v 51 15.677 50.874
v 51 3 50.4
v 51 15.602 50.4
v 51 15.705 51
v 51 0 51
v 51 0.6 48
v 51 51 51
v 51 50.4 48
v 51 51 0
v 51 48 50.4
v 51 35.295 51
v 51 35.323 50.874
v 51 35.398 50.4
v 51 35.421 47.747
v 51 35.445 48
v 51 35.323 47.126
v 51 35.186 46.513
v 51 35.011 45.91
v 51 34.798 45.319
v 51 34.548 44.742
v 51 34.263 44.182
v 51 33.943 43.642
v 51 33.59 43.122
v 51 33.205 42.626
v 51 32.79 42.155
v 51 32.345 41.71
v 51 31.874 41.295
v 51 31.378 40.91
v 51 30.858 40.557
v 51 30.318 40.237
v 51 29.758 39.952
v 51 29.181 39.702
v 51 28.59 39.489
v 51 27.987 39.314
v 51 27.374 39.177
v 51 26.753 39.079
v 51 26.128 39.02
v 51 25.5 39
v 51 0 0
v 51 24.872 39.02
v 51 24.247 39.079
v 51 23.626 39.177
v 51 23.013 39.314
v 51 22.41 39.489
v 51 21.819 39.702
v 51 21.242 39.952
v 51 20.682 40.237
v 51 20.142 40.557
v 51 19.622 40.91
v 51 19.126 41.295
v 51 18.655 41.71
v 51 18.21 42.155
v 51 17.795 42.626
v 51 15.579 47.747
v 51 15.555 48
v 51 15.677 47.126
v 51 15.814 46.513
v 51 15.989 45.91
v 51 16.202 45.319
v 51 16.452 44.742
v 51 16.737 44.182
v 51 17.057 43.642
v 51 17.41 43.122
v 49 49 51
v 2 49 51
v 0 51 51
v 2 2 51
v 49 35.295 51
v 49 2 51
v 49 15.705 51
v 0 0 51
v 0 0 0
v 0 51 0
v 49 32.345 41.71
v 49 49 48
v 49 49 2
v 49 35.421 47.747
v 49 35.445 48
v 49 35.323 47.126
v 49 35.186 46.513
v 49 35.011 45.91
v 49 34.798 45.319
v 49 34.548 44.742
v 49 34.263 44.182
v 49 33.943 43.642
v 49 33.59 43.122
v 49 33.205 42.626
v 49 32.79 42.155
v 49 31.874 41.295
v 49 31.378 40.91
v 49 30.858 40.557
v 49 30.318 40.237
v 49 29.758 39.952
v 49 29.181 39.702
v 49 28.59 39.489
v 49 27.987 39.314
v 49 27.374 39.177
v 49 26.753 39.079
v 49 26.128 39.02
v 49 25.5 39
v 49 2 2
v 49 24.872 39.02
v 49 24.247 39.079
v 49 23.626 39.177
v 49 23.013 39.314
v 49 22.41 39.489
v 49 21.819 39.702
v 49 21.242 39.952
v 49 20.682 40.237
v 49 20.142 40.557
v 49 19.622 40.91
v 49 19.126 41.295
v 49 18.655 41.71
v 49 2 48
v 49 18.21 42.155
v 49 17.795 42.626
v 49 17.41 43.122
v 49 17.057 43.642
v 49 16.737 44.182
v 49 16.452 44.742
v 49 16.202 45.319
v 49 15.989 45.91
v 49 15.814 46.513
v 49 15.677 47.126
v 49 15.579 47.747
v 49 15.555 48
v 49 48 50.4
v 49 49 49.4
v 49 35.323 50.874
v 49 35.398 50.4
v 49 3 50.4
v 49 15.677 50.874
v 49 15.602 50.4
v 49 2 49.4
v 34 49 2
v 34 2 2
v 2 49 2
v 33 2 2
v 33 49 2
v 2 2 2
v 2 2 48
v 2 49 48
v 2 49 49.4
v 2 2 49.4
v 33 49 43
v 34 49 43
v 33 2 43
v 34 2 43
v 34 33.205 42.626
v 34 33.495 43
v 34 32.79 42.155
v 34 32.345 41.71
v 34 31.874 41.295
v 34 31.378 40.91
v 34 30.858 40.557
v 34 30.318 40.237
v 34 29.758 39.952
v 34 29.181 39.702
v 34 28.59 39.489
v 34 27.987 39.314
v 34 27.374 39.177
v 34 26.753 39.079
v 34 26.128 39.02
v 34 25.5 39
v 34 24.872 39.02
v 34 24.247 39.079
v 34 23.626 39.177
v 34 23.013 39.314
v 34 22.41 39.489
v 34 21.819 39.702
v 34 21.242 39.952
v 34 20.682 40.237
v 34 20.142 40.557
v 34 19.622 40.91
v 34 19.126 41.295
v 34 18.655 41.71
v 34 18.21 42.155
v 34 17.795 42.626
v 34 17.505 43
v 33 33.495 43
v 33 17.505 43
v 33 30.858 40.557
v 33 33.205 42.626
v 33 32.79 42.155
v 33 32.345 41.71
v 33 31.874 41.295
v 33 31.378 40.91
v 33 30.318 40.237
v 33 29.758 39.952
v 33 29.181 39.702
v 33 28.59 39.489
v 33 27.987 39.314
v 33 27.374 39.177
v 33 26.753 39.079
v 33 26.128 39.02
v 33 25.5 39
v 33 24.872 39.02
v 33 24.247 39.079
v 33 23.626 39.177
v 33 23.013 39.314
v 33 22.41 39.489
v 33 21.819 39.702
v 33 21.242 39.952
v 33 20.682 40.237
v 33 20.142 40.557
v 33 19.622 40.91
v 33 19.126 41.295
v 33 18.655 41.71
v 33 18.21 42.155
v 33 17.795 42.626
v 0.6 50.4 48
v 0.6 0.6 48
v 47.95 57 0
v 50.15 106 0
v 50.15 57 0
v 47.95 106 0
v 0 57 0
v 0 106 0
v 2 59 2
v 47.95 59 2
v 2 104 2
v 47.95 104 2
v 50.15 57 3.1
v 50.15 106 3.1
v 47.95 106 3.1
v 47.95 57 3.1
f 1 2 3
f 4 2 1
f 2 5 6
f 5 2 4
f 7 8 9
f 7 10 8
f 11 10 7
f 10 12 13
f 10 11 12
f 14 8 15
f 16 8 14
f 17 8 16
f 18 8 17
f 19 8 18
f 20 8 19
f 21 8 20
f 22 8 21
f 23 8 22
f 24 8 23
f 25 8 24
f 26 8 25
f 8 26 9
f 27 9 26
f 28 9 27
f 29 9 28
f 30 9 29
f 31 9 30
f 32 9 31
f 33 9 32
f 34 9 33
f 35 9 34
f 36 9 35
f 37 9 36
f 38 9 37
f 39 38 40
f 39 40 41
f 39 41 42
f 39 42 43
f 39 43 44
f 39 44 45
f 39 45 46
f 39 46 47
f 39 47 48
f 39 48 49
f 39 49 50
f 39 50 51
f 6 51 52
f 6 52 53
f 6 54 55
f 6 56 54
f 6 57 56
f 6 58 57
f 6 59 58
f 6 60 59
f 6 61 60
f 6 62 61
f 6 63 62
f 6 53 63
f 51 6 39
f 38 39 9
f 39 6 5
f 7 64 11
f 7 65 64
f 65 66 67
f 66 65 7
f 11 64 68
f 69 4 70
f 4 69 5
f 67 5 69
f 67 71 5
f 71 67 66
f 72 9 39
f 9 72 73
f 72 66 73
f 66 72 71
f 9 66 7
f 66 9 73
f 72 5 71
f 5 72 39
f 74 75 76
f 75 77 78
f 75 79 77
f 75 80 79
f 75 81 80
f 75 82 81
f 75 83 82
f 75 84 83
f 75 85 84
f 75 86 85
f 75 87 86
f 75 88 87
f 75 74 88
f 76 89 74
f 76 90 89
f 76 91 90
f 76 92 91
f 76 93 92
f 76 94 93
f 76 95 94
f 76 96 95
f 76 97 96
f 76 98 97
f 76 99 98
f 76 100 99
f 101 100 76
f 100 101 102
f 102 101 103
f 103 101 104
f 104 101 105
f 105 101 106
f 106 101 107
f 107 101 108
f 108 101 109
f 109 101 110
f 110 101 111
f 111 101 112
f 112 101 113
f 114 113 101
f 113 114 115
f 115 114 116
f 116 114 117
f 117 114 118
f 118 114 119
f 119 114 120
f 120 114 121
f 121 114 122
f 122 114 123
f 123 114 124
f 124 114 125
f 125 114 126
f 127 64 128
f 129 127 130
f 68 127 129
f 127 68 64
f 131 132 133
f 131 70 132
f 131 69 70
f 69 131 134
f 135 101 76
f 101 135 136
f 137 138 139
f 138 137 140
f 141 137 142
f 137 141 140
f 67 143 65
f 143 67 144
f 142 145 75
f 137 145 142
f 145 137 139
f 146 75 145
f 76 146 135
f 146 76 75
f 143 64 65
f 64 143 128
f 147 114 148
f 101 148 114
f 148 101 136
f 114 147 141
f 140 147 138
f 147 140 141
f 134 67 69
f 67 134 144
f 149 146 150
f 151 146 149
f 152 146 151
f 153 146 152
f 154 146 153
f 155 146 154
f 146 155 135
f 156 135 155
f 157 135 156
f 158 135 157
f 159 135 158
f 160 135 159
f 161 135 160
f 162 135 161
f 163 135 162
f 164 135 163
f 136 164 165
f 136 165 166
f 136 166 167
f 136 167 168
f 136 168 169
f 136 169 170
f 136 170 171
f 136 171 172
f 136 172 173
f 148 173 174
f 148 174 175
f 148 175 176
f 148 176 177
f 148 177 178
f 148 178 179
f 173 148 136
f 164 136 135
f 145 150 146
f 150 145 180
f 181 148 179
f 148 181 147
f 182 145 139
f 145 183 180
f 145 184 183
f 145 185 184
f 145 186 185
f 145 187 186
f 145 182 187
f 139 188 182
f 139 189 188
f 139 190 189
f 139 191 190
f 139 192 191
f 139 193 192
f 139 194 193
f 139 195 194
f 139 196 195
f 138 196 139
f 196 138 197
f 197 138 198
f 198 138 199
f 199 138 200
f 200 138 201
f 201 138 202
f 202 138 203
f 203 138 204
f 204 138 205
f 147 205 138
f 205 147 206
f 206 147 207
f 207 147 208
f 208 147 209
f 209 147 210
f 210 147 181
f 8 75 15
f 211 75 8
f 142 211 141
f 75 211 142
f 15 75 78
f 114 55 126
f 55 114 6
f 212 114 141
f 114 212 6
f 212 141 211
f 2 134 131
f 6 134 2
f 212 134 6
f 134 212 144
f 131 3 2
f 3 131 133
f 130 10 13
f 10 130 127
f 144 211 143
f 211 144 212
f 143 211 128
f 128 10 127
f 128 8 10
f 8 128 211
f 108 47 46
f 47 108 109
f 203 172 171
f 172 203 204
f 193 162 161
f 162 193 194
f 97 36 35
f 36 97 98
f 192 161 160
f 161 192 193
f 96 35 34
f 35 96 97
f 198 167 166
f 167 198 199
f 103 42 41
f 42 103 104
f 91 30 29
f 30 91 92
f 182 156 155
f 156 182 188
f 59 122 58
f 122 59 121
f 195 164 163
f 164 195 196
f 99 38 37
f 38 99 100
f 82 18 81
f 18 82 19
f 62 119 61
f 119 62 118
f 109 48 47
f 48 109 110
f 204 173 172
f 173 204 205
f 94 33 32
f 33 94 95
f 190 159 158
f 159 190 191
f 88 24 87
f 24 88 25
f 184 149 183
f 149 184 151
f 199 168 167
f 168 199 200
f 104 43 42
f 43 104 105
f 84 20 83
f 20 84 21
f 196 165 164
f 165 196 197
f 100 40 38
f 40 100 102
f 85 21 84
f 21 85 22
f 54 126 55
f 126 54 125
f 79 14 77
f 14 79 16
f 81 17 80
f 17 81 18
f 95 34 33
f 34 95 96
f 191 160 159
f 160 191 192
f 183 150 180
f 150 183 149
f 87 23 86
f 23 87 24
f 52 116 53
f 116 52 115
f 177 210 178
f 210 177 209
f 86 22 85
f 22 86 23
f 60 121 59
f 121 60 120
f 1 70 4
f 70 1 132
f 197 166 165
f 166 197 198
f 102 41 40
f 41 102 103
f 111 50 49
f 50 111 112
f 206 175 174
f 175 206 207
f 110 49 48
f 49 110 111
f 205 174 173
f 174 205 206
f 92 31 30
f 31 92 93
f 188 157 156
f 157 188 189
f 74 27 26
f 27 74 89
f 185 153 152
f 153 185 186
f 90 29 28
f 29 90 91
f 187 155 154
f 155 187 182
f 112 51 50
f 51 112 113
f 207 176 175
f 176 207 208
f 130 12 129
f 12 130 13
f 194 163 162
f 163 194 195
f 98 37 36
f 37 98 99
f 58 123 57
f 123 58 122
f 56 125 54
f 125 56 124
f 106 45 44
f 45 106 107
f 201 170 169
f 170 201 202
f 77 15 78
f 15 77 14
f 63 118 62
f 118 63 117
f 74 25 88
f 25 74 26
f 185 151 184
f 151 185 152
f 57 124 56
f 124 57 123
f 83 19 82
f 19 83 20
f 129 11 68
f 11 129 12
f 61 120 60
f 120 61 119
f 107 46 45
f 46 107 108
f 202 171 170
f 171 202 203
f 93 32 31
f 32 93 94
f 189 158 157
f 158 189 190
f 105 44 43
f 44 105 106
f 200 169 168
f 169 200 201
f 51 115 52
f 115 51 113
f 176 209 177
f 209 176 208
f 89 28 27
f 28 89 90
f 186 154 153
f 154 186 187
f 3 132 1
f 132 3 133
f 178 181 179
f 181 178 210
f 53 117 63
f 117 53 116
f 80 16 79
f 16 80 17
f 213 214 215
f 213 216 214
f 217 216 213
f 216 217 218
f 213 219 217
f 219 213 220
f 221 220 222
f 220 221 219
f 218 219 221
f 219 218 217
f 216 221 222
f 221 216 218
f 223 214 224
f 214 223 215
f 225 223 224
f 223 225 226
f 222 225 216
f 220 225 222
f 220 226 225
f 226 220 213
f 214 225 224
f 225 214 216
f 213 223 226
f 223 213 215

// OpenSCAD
// file: carcassonne_box.scad
/**
 * @file carcassonne_box.scad
 * @author Conlan Wesson (modified by [Your Name])
 * Template for Carcassonne boxes.
 * @copyright Creative Commons Attribution-NonCommercial-ShareAlike 4.0
 */

mm = 1;
cm = 10*mm;

width = 47*mm;
thick = 2.5*mm;
wall = 2*mm;

/**
 * Lid for box.
 * @param sections Array of section lengths.
 * @param columns Number of columns.
 * @param icon Path to icon DXF file.
 * @param rot Icon rotation in degrees.
 * @param mult Icon scale.
 * @param xoff X-offset of icon from center.
 * @param yoff Y-offset of icon from center.
 */
module carcassonne_lid(sections, columns=1, icon=false, icon2=false, icon3=false, rot=0, mult=1, xoff=0, yoff=0, mult2=1, xoff2=0, yoff2=0, mult3=1, xoff3=0, yoff3=0, g=0){
    length = sum(sections) + ((width/2) - (sum(sections) % (width/2)));
    w = length+(1.5*wall)+.1;
    l = (width*columns)+wall;
    h = wall;
    d = 2;

    CubePoints = [
        [ 0-g, 0-g,   0 ],  //0
        [ w+g, 0-g,   0 ],  //1
        [ w+g, l+g,   0 ],  //2
        [ 0-g, l+g,   0 ],  //3
        [   d,   d, h+g ],  //4
        [   w,   d, h+g ],  //5
        [   w, l-d, h+g ],  //6
        [   d, l-d, h+g ]   //7
    ];
    
    CubeFaces = [
        [0,1,2,3],  // bottom
        [4,5,1,0],  // front
        [7,6,5,4],  // top
        [5,6,2,1],  // right
        [6,7,3,2],  // back
        [7,4,0,3]   // left
    ];
    
    difference(){
        union(){
            polyhedron( CubePoints, CubeFaces );
            translate([w-wall-.15,0,0]) cube([wall+.2,l, (1.5*wall)+.1]);
        }
        if(icon){
            translate([w/2+xoff,l/3+yoff,h-(wall/2)]){
                linear_extrude(height=(wall)+.1){
                    rotate(rot) scale(mult) import(icon);
                }
            }
        }
        if(icon2){
            translate([w/2+xoff2,l/3+yoff2,h-(wall/2)]){
                linear_extrude(height=(wall)+.1){
                    rotate(rot) scale(mult2) import(icon2);
                }
            }
        }
        if(icon3){
            translate([w/2+xoff3,l/3+yoff3,h-(wall/2)]){
                linear_extrude(height=(wall)+.1){
                    rotate(rot) scale(mult3) import(icon3);
                }
            }
        }
    }
}

/**
 * Carcassonne card box.
 * @param sections Array of section lengths.
 * @param columns Number of columns.
 */
module carcassonne_box(sections, columns=1){
    raw_length = sum(sections);
    extra_space = ((width/2) - (raw_length % (width/2))) % (width/2);
    length = raw_length + extra_space;
    
    section_count = len(sections);
    adjusted_sections = [for (i = [0:section_count-1]) 
        sections[i] + (extra_space / section_count)];
    
    difference(){
        union(){
            difference(){
                // Outer walls
                cube([length+(2*wall), (width*columns)+(2*wall), width+(2*wall)]);
                // Cavity
                translate([wall, wall, wall]){
                    cube([length, width*columns, (width+wall)+.1]);
                }
            }
            // Dividers
            for(col = [0:columns-1]){
                divider_positions = [for(i=0; i<len(adjusted_sections)-1; i=i+1) 
                    sum([for(j=[0:i]) adjusted_sections[j]])];
                for(pos = divider_positions){
                    translate([pos+wall, width*col+wall, 0]) 
                        cube([wall/2, width, width-(2*wall)]);
                }
                if(col > 0){
                    translate([0, width*col+(wall/2), 0]) 
                        cube([length+(2*wall)-18.0, wall/2, width-(2*wall)]);
                }
            }
        }
        union(){
            // Notch
            for(col = [0:columns-1]){
                translate([wall, wall+(width*col), wall]){
                    translate([0, width/2, width])
                    rotate([0, 90, 0]){
                        cylinder(r=10, h=length+(2*wall), $fn=100);
                    }
                }
            }
            // Track
            translate([wall/2,wall/2,width+wall/2]) 
                carcassonne_lid(adjusted_sections, columns, g=0.4);
        }
    }
}

// Helper function to sum an array
function sum(v, i = 0, r = 0) = i < len(v) ? sum(v, i + 1, r + v[i]) : r;
// main file
/**
 * @file bets.scad
 * @author Andrew Hargrave
 * The Bets Carcossonne box.
 * @copyright Creative Commons Attribution-NonCommercial-ShareAlike 4.0
 */

include <carcassonne_box.scad>

mm = 1;
tiles = 2*mm;

sections = [10*tiles, 5*mm];
columns = 1;
icon="0-bets.dxf";

carcassonne_box(sections, columns);
translate([0,width*columns+10,0]) carcassonne_lid(sections, columns, icon, rot=90, mult=2.2, xoff=21, yoff=-9); 
